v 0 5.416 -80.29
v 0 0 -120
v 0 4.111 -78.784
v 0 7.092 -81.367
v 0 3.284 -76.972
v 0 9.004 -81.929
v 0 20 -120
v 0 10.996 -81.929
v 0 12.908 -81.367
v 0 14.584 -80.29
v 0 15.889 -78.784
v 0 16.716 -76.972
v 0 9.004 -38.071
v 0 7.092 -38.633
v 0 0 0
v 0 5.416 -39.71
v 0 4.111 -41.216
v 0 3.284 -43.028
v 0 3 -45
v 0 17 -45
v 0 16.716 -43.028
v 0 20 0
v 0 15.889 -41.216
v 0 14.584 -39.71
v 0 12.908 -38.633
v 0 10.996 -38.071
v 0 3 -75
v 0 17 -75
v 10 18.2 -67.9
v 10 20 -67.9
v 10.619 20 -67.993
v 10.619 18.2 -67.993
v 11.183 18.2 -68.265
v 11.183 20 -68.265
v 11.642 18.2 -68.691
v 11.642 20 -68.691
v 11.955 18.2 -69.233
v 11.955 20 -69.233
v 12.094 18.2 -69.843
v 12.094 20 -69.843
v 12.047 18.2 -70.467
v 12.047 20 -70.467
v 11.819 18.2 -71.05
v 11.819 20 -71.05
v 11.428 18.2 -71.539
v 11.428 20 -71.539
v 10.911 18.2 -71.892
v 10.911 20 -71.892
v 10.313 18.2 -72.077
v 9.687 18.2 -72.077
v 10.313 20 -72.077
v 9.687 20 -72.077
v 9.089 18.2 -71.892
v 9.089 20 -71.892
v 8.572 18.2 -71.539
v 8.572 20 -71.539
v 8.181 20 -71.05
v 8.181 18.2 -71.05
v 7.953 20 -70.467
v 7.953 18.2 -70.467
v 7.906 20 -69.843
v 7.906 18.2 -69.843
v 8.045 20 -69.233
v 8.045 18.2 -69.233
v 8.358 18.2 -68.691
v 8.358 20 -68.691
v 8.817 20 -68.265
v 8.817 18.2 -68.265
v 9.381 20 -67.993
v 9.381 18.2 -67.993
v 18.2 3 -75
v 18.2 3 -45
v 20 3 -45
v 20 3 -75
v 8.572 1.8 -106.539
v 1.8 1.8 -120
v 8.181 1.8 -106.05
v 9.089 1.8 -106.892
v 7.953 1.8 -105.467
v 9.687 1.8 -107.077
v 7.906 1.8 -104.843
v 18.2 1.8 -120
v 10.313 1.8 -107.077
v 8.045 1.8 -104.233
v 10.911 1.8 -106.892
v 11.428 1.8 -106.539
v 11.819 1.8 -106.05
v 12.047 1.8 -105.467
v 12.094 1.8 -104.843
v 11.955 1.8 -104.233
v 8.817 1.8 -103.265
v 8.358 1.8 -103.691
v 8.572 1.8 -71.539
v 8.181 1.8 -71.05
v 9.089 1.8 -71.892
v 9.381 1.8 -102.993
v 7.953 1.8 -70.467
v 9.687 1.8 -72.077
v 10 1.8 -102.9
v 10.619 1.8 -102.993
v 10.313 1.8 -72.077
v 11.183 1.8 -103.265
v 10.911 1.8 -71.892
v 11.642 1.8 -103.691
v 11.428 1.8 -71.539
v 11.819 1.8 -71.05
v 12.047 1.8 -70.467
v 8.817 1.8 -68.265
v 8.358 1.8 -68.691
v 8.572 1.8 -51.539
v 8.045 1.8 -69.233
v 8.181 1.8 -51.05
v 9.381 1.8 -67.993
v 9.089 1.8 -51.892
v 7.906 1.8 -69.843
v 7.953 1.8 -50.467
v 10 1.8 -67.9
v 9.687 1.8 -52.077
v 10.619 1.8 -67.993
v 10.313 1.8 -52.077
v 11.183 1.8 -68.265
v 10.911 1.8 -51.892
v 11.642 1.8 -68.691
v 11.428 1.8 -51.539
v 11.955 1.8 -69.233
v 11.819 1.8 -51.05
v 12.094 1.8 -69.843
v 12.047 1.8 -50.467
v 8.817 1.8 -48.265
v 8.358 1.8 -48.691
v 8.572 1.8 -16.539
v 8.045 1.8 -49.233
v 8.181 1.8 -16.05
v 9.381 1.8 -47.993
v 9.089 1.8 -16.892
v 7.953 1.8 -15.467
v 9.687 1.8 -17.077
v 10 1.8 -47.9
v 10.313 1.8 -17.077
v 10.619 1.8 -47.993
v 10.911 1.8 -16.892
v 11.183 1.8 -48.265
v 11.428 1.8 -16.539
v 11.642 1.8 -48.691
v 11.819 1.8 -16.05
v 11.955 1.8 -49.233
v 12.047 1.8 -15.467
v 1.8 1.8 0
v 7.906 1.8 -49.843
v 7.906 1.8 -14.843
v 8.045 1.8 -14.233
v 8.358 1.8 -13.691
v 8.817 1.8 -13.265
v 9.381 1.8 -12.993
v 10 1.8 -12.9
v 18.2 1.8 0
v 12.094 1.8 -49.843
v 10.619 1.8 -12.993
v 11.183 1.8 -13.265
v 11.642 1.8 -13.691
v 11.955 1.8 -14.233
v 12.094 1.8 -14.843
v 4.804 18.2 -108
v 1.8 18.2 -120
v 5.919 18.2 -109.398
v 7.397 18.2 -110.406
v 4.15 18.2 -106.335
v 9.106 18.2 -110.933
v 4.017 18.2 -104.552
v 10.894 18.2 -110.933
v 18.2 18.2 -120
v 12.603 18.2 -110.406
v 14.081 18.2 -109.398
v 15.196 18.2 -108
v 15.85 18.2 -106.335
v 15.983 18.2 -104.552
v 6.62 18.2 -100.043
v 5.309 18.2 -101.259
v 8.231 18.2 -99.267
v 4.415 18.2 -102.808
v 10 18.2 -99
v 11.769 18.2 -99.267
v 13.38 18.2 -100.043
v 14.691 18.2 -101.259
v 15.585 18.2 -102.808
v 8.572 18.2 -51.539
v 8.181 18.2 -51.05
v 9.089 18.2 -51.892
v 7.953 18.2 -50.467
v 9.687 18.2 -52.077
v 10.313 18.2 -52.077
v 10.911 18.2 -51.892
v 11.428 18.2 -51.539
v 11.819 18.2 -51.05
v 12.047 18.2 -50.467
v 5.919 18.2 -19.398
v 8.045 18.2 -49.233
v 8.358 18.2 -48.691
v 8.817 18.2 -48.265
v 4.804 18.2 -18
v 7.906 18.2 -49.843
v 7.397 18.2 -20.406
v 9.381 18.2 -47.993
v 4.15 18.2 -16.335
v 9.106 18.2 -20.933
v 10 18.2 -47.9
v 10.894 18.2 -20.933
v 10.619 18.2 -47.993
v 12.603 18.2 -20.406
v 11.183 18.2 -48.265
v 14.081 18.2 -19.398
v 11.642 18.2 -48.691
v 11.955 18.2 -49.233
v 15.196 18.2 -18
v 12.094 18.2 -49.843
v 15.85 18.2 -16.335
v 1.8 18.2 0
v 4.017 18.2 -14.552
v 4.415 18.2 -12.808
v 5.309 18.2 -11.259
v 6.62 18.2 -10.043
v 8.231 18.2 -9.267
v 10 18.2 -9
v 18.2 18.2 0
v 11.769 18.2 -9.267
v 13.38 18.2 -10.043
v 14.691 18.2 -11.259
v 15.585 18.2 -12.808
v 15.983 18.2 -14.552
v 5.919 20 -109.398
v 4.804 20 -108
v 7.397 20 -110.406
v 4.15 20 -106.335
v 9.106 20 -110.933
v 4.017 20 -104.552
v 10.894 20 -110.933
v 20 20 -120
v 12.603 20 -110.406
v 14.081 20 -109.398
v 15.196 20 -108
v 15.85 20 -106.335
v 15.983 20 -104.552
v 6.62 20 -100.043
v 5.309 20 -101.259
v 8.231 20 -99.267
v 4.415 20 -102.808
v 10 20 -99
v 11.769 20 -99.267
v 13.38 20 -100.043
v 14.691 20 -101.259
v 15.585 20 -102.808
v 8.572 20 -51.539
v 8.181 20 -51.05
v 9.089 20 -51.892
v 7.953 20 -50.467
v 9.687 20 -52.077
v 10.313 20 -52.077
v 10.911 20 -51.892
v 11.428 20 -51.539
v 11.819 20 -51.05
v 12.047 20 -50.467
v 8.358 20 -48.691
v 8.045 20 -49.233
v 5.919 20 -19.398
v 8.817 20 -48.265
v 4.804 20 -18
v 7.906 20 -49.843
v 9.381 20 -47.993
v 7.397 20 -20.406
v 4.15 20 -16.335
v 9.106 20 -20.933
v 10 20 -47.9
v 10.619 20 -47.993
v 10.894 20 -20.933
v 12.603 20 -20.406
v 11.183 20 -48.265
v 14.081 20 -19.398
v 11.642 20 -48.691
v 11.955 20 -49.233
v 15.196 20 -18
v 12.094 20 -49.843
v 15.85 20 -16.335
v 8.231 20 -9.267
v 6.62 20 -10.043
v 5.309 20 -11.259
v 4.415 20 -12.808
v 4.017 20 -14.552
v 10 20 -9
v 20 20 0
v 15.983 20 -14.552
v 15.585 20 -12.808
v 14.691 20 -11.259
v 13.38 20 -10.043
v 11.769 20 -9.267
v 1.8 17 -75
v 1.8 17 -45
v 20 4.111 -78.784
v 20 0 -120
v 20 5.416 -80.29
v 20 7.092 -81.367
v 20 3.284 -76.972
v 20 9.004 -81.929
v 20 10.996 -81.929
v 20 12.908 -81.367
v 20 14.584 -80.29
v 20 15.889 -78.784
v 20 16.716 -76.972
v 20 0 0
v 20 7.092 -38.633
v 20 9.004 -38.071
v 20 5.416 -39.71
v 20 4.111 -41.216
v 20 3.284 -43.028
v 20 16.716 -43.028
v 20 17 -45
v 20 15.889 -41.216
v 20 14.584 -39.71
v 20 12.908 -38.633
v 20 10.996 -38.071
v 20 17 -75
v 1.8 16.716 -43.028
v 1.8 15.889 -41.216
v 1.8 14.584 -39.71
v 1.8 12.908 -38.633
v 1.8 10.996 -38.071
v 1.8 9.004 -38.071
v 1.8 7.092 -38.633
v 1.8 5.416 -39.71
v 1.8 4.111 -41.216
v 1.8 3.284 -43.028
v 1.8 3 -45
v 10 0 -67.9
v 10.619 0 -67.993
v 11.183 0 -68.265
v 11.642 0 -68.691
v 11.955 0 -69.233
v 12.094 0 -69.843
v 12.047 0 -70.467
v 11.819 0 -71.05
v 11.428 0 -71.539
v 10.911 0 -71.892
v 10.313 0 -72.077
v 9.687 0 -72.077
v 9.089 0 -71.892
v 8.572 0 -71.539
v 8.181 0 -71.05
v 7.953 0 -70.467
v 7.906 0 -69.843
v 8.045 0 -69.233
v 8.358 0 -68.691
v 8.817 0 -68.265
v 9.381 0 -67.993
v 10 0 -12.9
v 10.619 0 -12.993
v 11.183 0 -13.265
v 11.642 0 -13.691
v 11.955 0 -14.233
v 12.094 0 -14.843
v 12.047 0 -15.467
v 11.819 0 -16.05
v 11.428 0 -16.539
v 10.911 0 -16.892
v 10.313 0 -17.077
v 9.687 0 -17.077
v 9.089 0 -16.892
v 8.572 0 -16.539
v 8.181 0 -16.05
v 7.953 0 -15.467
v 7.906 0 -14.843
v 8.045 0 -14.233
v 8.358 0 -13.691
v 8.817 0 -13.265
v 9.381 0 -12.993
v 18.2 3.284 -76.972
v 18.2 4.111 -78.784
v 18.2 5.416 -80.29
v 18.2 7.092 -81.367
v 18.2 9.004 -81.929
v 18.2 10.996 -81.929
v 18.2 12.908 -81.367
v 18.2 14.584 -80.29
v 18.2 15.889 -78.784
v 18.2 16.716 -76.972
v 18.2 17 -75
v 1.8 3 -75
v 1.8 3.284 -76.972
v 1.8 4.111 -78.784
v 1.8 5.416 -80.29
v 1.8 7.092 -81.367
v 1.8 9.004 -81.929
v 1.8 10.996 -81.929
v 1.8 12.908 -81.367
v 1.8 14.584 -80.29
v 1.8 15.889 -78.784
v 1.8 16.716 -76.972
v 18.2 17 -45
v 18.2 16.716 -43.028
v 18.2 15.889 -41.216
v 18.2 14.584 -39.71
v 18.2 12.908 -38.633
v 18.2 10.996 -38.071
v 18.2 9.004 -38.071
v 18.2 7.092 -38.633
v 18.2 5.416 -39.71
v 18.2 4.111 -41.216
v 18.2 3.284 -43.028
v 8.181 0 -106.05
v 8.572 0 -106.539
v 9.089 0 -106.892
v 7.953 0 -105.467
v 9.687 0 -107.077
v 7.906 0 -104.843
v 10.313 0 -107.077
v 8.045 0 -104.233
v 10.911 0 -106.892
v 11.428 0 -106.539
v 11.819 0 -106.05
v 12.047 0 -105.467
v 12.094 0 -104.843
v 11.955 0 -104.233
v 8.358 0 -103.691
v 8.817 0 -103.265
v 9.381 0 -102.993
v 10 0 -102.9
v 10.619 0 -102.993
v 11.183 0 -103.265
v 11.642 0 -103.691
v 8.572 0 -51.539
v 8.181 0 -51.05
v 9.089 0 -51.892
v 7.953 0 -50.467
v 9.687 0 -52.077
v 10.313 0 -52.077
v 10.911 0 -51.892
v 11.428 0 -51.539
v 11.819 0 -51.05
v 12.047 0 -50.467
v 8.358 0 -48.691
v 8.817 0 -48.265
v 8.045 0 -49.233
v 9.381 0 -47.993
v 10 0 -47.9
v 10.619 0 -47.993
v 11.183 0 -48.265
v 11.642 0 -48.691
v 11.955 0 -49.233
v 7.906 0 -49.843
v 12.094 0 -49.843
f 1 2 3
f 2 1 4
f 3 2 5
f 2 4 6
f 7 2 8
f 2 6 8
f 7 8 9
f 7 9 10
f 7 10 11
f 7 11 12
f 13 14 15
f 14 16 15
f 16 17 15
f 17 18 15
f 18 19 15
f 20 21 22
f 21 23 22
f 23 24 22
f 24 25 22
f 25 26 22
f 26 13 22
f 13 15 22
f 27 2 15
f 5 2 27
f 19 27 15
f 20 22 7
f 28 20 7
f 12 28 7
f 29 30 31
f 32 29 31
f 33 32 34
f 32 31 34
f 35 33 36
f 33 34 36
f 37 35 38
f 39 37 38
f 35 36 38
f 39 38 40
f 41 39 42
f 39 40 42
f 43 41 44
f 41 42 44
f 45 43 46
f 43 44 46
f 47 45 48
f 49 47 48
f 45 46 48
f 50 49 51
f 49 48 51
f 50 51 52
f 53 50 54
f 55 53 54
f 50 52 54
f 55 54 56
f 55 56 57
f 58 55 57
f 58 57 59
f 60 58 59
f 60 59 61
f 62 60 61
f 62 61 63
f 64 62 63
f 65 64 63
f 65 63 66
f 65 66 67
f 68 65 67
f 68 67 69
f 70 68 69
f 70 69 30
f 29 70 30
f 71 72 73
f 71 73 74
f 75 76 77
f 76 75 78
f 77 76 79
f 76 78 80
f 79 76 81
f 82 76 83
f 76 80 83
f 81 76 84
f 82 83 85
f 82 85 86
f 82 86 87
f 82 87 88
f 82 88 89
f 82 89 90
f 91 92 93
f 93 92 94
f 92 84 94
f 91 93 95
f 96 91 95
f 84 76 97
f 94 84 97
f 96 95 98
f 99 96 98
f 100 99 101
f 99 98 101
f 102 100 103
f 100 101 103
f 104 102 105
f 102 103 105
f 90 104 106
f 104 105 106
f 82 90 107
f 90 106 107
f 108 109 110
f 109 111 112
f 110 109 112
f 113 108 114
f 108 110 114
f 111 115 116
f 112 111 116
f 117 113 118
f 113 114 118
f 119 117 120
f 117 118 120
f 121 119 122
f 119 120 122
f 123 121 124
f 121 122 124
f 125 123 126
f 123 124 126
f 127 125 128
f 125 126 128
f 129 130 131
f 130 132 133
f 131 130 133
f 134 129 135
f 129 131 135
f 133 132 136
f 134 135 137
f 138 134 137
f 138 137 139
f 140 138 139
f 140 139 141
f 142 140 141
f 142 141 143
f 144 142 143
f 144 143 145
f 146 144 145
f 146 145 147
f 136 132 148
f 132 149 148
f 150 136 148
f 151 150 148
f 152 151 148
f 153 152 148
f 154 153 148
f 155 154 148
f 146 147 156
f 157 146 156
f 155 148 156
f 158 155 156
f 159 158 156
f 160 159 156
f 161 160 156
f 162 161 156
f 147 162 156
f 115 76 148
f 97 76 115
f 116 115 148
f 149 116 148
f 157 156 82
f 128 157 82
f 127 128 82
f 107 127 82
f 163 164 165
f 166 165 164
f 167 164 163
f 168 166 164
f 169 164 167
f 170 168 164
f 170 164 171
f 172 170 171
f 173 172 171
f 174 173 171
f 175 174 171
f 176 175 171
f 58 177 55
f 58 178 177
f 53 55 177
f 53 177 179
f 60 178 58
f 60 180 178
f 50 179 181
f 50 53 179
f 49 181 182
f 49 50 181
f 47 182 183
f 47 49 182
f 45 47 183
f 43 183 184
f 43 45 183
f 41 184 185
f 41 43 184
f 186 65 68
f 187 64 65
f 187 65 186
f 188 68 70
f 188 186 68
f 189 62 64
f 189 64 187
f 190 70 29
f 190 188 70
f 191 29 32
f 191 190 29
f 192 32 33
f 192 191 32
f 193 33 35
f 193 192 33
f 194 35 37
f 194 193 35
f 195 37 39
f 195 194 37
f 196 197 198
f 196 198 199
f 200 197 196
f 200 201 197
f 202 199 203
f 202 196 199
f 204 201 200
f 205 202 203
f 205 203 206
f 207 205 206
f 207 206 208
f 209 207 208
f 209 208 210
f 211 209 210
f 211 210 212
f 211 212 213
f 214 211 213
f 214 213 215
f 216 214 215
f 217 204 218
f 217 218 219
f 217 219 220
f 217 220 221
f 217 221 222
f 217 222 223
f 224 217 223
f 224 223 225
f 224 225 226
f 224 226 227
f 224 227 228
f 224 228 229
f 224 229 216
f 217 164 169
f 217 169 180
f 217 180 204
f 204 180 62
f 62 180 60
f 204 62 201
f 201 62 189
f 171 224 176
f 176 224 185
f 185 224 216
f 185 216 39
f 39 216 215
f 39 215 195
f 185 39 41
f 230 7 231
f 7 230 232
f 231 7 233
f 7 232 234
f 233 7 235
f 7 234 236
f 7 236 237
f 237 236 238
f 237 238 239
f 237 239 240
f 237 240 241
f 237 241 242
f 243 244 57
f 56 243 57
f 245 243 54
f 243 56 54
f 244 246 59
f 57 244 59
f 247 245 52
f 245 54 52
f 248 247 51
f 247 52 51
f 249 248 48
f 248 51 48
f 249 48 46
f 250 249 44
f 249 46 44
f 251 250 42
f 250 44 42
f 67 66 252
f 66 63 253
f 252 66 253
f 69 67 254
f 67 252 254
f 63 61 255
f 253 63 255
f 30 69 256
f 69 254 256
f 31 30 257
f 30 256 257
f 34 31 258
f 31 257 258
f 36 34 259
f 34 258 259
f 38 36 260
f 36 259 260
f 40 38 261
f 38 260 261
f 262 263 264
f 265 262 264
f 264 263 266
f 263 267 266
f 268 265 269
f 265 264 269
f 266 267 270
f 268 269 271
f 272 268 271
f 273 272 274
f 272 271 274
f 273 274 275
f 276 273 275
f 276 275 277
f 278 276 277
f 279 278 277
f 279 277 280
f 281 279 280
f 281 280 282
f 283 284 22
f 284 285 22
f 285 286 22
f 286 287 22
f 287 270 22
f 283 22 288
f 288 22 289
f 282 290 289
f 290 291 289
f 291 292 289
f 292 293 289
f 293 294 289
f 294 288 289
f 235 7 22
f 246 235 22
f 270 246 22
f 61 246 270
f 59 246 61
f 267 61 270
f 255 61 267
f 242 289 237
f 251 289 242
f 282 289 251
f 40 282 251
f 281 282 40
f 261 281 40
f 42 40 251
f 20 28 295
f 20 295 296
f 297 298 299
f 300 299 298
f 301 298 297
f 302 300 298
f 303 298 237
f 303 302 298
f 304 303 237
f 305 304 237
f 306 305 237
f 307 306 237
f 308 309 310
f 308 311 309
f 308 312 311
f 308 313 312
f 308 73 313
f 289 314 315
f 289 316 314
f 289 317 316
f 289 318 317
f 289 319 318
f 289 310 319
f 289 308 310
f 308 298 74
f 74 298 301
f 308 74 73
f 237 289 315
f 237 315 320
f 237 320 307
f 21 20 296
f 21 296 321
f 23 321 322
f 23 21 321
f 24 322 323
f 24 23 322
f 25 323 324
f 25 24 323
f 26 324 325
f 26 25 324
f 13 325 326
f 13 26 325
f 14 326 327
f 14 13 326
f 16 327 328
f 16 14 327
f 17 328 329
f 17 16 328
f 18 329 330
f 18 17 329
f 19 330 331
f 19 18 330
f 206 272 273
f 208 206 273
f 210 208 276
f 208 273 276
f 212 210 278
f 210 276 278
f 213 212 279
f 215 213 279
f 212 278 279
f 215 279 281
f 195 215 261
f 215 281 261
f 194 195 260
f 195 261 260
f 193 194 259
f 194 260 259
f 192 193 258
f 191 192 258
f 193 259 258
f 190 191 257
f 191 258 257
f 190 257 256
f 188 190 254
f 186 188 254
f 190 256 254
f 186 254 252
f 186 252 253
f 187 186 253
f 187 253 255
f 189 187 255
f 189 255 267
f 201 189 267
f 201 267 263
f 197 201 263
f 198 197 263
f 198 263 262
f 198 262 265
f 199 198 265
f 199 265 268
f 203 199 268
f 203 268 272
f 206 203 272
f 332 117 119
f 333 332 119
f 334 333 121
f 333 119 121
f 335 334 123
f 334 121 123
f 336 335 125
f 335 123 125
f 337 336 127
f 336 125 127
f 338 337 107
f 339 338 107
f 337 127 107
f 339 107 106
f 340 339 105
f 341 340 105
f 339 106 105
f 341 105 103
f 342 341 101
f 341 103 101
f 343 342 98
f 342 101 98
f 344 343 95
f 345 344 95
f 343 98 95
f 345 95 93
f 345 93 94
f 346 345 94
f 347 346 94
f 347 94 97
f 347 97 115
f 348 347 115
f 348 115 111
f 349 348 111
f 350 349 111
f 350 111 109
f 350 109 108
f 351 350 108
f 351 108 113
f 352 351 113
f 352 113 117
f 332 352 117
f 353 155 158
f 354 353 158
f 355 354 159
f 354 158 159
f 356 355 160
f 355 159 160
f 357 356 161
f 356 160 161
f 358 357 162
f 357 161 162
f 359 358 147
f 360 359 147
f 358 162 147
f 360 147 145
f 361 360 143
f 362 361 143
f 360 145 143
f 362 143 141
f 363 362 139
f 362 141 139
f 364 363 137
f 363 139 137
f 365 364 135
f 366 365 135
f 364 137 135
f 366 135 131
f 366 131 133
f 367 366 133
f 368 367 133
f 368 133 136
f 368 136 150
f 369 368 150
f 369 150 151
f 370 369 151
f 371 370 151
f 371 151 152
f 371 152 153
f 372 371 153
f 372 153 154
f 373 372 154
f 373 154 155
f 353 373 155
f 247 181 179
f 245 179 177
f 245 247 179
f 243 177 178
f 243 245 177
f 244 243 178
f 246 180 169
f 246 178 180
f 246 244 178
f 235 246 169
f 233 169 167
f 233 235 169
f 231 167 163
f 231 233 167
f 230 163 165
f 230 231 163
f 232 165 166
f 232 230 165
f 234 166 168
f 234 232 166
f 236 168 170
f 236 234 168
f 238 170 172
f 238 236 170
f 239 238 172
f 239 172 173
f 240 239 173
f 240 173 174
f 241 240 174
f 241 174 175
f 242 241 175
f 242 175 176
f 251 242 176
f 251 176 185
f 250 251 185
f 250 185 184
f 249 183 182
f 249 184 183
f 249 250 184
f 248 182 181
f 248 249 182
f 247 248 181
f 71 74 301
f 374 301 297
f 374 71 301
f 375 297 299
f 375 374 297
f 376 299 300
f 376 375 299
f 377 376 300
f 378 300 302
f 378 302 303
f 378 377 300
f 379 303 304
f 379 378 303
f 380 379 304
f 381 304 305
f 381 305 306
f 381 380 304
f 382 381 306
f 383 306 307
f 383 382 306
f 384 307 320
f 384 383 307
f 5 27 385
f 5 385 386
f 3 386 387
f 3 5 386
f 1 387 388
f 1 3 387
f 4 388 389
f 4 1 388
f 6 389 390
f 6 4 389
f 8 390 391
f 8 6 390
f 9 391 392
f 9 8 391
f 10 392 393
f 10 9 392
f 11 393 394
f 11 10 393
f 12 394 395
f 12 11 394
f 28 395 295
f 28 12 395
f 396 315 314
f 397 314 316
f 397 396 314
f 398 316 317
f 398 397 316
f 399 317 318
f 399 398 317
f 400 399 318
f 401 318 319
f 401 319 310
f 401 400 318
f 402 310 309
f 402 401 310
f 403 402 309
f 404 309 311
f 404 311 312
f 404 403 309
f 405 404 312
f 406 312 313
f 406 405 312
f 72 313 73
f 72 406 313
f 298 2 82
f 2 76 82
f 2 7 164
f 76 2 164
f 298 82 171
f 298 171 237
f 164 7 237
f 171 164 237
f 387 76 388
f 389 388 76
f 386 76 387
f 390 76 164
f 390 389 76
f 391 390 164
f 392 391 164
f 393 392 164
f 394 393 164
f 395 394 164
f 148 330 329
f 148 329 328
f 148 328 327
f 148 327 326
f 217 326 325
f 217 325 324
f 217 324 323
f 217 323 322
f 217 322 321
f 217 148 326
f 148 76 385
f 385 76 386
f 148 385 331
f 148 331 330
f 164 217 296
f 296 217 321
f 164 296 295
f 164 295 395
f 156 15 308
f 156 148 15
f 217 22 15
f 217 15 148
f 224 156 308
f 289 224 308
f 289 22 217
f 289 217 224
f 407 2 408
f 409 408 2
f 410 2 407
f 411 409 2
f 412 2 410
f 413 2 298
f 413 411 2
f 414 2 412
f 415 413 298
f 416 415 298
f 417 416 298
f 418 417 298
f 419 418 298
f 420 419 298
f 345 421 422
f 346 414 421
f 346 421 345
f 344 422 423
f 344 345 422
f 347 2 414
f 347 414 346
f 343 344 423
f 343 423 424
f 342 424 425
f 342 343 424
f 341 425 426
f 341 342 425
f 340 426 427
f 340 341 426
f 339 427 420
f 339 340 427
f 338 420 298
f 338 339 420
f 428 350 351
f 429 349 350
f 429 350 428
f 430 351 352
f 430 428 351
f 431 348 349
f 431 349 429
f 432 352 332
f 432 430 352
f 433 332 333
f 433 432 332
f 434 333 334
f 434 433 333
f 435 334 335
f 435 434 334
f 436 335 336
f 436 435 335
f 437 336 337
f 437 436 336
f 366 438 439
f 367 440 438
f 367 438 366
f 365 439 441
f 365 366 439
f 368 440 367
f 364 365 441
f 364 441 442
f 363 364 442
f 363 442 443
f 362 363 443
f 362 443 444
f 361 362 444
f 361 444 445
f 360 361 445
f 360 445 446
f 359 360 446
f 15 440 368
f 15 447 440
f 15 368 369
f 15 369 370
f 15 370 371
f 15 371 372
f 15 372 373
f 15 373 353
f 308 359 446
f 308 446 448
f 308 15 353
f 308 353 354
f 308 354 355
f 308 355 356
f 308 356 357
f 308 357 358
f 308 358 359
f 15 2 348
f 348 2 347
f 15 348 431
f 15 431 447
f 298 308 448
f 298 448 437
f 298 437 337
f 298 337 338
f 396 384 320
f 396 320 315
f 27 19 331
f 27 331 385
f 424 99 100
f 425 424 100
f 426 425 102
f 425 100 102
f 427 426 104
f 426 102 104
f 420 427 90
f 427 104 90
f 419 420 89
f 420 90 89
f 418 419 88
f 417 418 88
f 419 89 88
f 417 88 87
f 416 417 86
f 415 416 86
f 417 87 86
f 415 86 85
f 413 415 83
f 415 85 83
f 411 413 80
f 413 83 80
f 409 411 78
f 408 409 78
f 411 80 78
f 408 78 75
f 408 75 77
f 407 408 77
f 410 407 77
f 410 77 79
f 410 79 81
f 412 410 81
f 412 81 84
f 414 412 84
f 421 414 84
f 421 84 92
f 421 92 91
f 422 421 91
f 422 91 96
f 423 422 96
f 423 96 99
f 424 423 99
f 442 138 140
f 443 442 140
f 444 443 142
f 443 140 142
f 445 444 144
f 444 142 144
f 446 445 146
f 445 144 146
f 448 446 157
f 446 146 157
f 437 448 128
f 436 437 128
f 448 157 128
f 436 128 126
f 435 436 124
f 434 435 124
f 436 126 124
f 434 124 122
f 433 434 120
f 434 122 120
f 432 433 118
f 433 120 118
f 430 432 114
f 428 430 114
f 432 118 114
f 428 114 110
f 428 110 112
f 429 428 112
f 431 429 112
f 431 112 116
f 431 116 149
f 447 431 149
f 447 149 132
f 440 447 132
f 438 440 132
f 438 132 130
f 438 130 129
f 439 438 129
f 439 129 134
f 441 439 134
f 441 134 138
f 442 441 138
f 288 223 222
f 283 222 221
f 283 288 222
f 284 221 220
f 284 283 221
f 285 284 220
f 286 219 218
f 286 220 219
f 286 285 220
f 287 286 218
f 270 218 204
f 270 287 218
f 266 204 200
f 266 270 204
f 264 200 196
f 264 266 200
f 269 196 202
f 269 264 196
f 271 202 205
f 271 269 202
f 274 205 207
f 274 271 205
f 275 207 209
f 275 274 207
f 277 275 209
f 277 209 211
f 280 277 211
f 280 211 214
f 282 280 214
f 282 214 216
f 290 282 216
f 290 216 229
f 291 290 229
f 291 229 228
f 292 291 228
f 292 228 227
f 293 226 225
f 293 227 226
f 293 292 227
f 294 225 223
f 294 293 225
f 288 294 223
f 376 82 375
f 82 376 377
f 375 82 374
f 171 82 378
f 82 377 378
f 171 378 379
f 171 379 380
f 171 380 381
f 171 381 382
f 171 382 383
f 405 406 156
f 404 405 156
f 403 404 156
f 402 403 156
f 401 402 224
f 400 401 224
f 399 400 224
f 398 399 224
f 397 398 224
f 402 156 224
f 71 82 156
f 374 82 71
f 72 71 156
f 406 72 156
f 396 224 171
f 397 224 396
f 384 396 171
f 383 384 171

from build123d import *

# Parameters (mm, degrees)
SKETCH_3_W              = 20
SKETCH_3_H              = 20
SKETCH_3_W_2            = 16.4
SKETCH_3_H_2            = 16.4
EXTRUDE_1_DEPTH         = 120
HOLE_WIZARD_4_2_4_2_1_D = 4.2
CUT_EXTRUDE_START       = -20
CUT_EXTRUDE_1_DEPTH     = 20
CUT_EXTRUDE_2_REACH     = 125.288
SKETCH_8_R              = 6


# Read off the part's stored shape, not the designer's step: 切除-拉伸1
with BuildPart() as part:
    # 草图3 → 凸台-拉伸1 (new body)
    with BuildSketch(Plane.XY):
        with Locations((10, 10)):
            Rectangle(SKETCH_3_W, SKETCH_3_H)
        with Locations((10, 10)):
            Rectangle(SKETCH_3_W_2, SKETCH_3_H_2, mode=Mode.SUBTRACT)
    extrude(amount=-EXTRUDE_1_DEPTH)

    # Ø4.2 (4.2) 直径孔1 (through all)
    with Locations(Plane(origin=(10, 0, -105), x_dir=(0, 0, -1), z_dir=(0, -1, 0))):
        with Locations((0, 0), (-35, 0), (-55, 0), (-90, 0)):
            Hole(HOLE_WIZARD_4_2_4_2_1_D / 2)

    # 切除-拉伸1 outline → 切除-拉伸1 (cut)
    with BuildSketch(Plane(origin=(20, 0, 0), x_dir=(0, 0, -1), z_dir=(1, 0, 0)).offset(CUT_EXTRUDE_START)):
        with BuildLine():
            ThreePointArc((45, 17), (38, 10), (45, 3))
            Line((45, 3), (75, 3))
            ThreePointArc((75, 3), (82, 10), (75, 17))
            Line((75, 17), (45, 17))
        make_face()
    extrude(amount=CUT_EXTRUDE_1_DEPTH, mode=Mode.SUBTRACT)

    # 草图8 → 切除-拉伸2 (cut, up to next)
    with BuildSketch(Plane.XZ.offset(-20), mode=Mode.PRIVATE) as cut_extrude_2_sk1:
        with Locations(Location((10, -105, 0), (0, 0, 90))):
            Circle(SKETCH_8_R)
    cut_extrude_2_tool1 = extrude(cut_extrude_2_sk1.sketch, amount=CUT_EXTRUDE_2_REACH, mode=Mode.PRIVATE) & part.part
    # 草图8 → 切除-拉伸2 (cut, up to next)
    with BuildSketch(Plane.XZ.offset(-20), mode=Mode.PRIVATE) as cut_extrude_2_sk2:
        with Locations(Location((10, -15, 0), (0, 0, 90))):
            Circle(SKETCH_8_R)
    cut_extrude_2_tool2 = extrude(cut_extrude_2_sk2.sketch, amount=CUT_EXTRUDE_2_REACH, mode=Mode.PRIVATE) & part.part
    add(cut_extrude_2_tool1.solids().sort_by_distance((10, 20, -105))[0], mode=Mode.SUBTRACT)
    add(cut_extrude_2_tool2.solids().sort_by_distance((10, 20, -15))[0], mode=Mode.SUBTRACT)


solid = part.part
